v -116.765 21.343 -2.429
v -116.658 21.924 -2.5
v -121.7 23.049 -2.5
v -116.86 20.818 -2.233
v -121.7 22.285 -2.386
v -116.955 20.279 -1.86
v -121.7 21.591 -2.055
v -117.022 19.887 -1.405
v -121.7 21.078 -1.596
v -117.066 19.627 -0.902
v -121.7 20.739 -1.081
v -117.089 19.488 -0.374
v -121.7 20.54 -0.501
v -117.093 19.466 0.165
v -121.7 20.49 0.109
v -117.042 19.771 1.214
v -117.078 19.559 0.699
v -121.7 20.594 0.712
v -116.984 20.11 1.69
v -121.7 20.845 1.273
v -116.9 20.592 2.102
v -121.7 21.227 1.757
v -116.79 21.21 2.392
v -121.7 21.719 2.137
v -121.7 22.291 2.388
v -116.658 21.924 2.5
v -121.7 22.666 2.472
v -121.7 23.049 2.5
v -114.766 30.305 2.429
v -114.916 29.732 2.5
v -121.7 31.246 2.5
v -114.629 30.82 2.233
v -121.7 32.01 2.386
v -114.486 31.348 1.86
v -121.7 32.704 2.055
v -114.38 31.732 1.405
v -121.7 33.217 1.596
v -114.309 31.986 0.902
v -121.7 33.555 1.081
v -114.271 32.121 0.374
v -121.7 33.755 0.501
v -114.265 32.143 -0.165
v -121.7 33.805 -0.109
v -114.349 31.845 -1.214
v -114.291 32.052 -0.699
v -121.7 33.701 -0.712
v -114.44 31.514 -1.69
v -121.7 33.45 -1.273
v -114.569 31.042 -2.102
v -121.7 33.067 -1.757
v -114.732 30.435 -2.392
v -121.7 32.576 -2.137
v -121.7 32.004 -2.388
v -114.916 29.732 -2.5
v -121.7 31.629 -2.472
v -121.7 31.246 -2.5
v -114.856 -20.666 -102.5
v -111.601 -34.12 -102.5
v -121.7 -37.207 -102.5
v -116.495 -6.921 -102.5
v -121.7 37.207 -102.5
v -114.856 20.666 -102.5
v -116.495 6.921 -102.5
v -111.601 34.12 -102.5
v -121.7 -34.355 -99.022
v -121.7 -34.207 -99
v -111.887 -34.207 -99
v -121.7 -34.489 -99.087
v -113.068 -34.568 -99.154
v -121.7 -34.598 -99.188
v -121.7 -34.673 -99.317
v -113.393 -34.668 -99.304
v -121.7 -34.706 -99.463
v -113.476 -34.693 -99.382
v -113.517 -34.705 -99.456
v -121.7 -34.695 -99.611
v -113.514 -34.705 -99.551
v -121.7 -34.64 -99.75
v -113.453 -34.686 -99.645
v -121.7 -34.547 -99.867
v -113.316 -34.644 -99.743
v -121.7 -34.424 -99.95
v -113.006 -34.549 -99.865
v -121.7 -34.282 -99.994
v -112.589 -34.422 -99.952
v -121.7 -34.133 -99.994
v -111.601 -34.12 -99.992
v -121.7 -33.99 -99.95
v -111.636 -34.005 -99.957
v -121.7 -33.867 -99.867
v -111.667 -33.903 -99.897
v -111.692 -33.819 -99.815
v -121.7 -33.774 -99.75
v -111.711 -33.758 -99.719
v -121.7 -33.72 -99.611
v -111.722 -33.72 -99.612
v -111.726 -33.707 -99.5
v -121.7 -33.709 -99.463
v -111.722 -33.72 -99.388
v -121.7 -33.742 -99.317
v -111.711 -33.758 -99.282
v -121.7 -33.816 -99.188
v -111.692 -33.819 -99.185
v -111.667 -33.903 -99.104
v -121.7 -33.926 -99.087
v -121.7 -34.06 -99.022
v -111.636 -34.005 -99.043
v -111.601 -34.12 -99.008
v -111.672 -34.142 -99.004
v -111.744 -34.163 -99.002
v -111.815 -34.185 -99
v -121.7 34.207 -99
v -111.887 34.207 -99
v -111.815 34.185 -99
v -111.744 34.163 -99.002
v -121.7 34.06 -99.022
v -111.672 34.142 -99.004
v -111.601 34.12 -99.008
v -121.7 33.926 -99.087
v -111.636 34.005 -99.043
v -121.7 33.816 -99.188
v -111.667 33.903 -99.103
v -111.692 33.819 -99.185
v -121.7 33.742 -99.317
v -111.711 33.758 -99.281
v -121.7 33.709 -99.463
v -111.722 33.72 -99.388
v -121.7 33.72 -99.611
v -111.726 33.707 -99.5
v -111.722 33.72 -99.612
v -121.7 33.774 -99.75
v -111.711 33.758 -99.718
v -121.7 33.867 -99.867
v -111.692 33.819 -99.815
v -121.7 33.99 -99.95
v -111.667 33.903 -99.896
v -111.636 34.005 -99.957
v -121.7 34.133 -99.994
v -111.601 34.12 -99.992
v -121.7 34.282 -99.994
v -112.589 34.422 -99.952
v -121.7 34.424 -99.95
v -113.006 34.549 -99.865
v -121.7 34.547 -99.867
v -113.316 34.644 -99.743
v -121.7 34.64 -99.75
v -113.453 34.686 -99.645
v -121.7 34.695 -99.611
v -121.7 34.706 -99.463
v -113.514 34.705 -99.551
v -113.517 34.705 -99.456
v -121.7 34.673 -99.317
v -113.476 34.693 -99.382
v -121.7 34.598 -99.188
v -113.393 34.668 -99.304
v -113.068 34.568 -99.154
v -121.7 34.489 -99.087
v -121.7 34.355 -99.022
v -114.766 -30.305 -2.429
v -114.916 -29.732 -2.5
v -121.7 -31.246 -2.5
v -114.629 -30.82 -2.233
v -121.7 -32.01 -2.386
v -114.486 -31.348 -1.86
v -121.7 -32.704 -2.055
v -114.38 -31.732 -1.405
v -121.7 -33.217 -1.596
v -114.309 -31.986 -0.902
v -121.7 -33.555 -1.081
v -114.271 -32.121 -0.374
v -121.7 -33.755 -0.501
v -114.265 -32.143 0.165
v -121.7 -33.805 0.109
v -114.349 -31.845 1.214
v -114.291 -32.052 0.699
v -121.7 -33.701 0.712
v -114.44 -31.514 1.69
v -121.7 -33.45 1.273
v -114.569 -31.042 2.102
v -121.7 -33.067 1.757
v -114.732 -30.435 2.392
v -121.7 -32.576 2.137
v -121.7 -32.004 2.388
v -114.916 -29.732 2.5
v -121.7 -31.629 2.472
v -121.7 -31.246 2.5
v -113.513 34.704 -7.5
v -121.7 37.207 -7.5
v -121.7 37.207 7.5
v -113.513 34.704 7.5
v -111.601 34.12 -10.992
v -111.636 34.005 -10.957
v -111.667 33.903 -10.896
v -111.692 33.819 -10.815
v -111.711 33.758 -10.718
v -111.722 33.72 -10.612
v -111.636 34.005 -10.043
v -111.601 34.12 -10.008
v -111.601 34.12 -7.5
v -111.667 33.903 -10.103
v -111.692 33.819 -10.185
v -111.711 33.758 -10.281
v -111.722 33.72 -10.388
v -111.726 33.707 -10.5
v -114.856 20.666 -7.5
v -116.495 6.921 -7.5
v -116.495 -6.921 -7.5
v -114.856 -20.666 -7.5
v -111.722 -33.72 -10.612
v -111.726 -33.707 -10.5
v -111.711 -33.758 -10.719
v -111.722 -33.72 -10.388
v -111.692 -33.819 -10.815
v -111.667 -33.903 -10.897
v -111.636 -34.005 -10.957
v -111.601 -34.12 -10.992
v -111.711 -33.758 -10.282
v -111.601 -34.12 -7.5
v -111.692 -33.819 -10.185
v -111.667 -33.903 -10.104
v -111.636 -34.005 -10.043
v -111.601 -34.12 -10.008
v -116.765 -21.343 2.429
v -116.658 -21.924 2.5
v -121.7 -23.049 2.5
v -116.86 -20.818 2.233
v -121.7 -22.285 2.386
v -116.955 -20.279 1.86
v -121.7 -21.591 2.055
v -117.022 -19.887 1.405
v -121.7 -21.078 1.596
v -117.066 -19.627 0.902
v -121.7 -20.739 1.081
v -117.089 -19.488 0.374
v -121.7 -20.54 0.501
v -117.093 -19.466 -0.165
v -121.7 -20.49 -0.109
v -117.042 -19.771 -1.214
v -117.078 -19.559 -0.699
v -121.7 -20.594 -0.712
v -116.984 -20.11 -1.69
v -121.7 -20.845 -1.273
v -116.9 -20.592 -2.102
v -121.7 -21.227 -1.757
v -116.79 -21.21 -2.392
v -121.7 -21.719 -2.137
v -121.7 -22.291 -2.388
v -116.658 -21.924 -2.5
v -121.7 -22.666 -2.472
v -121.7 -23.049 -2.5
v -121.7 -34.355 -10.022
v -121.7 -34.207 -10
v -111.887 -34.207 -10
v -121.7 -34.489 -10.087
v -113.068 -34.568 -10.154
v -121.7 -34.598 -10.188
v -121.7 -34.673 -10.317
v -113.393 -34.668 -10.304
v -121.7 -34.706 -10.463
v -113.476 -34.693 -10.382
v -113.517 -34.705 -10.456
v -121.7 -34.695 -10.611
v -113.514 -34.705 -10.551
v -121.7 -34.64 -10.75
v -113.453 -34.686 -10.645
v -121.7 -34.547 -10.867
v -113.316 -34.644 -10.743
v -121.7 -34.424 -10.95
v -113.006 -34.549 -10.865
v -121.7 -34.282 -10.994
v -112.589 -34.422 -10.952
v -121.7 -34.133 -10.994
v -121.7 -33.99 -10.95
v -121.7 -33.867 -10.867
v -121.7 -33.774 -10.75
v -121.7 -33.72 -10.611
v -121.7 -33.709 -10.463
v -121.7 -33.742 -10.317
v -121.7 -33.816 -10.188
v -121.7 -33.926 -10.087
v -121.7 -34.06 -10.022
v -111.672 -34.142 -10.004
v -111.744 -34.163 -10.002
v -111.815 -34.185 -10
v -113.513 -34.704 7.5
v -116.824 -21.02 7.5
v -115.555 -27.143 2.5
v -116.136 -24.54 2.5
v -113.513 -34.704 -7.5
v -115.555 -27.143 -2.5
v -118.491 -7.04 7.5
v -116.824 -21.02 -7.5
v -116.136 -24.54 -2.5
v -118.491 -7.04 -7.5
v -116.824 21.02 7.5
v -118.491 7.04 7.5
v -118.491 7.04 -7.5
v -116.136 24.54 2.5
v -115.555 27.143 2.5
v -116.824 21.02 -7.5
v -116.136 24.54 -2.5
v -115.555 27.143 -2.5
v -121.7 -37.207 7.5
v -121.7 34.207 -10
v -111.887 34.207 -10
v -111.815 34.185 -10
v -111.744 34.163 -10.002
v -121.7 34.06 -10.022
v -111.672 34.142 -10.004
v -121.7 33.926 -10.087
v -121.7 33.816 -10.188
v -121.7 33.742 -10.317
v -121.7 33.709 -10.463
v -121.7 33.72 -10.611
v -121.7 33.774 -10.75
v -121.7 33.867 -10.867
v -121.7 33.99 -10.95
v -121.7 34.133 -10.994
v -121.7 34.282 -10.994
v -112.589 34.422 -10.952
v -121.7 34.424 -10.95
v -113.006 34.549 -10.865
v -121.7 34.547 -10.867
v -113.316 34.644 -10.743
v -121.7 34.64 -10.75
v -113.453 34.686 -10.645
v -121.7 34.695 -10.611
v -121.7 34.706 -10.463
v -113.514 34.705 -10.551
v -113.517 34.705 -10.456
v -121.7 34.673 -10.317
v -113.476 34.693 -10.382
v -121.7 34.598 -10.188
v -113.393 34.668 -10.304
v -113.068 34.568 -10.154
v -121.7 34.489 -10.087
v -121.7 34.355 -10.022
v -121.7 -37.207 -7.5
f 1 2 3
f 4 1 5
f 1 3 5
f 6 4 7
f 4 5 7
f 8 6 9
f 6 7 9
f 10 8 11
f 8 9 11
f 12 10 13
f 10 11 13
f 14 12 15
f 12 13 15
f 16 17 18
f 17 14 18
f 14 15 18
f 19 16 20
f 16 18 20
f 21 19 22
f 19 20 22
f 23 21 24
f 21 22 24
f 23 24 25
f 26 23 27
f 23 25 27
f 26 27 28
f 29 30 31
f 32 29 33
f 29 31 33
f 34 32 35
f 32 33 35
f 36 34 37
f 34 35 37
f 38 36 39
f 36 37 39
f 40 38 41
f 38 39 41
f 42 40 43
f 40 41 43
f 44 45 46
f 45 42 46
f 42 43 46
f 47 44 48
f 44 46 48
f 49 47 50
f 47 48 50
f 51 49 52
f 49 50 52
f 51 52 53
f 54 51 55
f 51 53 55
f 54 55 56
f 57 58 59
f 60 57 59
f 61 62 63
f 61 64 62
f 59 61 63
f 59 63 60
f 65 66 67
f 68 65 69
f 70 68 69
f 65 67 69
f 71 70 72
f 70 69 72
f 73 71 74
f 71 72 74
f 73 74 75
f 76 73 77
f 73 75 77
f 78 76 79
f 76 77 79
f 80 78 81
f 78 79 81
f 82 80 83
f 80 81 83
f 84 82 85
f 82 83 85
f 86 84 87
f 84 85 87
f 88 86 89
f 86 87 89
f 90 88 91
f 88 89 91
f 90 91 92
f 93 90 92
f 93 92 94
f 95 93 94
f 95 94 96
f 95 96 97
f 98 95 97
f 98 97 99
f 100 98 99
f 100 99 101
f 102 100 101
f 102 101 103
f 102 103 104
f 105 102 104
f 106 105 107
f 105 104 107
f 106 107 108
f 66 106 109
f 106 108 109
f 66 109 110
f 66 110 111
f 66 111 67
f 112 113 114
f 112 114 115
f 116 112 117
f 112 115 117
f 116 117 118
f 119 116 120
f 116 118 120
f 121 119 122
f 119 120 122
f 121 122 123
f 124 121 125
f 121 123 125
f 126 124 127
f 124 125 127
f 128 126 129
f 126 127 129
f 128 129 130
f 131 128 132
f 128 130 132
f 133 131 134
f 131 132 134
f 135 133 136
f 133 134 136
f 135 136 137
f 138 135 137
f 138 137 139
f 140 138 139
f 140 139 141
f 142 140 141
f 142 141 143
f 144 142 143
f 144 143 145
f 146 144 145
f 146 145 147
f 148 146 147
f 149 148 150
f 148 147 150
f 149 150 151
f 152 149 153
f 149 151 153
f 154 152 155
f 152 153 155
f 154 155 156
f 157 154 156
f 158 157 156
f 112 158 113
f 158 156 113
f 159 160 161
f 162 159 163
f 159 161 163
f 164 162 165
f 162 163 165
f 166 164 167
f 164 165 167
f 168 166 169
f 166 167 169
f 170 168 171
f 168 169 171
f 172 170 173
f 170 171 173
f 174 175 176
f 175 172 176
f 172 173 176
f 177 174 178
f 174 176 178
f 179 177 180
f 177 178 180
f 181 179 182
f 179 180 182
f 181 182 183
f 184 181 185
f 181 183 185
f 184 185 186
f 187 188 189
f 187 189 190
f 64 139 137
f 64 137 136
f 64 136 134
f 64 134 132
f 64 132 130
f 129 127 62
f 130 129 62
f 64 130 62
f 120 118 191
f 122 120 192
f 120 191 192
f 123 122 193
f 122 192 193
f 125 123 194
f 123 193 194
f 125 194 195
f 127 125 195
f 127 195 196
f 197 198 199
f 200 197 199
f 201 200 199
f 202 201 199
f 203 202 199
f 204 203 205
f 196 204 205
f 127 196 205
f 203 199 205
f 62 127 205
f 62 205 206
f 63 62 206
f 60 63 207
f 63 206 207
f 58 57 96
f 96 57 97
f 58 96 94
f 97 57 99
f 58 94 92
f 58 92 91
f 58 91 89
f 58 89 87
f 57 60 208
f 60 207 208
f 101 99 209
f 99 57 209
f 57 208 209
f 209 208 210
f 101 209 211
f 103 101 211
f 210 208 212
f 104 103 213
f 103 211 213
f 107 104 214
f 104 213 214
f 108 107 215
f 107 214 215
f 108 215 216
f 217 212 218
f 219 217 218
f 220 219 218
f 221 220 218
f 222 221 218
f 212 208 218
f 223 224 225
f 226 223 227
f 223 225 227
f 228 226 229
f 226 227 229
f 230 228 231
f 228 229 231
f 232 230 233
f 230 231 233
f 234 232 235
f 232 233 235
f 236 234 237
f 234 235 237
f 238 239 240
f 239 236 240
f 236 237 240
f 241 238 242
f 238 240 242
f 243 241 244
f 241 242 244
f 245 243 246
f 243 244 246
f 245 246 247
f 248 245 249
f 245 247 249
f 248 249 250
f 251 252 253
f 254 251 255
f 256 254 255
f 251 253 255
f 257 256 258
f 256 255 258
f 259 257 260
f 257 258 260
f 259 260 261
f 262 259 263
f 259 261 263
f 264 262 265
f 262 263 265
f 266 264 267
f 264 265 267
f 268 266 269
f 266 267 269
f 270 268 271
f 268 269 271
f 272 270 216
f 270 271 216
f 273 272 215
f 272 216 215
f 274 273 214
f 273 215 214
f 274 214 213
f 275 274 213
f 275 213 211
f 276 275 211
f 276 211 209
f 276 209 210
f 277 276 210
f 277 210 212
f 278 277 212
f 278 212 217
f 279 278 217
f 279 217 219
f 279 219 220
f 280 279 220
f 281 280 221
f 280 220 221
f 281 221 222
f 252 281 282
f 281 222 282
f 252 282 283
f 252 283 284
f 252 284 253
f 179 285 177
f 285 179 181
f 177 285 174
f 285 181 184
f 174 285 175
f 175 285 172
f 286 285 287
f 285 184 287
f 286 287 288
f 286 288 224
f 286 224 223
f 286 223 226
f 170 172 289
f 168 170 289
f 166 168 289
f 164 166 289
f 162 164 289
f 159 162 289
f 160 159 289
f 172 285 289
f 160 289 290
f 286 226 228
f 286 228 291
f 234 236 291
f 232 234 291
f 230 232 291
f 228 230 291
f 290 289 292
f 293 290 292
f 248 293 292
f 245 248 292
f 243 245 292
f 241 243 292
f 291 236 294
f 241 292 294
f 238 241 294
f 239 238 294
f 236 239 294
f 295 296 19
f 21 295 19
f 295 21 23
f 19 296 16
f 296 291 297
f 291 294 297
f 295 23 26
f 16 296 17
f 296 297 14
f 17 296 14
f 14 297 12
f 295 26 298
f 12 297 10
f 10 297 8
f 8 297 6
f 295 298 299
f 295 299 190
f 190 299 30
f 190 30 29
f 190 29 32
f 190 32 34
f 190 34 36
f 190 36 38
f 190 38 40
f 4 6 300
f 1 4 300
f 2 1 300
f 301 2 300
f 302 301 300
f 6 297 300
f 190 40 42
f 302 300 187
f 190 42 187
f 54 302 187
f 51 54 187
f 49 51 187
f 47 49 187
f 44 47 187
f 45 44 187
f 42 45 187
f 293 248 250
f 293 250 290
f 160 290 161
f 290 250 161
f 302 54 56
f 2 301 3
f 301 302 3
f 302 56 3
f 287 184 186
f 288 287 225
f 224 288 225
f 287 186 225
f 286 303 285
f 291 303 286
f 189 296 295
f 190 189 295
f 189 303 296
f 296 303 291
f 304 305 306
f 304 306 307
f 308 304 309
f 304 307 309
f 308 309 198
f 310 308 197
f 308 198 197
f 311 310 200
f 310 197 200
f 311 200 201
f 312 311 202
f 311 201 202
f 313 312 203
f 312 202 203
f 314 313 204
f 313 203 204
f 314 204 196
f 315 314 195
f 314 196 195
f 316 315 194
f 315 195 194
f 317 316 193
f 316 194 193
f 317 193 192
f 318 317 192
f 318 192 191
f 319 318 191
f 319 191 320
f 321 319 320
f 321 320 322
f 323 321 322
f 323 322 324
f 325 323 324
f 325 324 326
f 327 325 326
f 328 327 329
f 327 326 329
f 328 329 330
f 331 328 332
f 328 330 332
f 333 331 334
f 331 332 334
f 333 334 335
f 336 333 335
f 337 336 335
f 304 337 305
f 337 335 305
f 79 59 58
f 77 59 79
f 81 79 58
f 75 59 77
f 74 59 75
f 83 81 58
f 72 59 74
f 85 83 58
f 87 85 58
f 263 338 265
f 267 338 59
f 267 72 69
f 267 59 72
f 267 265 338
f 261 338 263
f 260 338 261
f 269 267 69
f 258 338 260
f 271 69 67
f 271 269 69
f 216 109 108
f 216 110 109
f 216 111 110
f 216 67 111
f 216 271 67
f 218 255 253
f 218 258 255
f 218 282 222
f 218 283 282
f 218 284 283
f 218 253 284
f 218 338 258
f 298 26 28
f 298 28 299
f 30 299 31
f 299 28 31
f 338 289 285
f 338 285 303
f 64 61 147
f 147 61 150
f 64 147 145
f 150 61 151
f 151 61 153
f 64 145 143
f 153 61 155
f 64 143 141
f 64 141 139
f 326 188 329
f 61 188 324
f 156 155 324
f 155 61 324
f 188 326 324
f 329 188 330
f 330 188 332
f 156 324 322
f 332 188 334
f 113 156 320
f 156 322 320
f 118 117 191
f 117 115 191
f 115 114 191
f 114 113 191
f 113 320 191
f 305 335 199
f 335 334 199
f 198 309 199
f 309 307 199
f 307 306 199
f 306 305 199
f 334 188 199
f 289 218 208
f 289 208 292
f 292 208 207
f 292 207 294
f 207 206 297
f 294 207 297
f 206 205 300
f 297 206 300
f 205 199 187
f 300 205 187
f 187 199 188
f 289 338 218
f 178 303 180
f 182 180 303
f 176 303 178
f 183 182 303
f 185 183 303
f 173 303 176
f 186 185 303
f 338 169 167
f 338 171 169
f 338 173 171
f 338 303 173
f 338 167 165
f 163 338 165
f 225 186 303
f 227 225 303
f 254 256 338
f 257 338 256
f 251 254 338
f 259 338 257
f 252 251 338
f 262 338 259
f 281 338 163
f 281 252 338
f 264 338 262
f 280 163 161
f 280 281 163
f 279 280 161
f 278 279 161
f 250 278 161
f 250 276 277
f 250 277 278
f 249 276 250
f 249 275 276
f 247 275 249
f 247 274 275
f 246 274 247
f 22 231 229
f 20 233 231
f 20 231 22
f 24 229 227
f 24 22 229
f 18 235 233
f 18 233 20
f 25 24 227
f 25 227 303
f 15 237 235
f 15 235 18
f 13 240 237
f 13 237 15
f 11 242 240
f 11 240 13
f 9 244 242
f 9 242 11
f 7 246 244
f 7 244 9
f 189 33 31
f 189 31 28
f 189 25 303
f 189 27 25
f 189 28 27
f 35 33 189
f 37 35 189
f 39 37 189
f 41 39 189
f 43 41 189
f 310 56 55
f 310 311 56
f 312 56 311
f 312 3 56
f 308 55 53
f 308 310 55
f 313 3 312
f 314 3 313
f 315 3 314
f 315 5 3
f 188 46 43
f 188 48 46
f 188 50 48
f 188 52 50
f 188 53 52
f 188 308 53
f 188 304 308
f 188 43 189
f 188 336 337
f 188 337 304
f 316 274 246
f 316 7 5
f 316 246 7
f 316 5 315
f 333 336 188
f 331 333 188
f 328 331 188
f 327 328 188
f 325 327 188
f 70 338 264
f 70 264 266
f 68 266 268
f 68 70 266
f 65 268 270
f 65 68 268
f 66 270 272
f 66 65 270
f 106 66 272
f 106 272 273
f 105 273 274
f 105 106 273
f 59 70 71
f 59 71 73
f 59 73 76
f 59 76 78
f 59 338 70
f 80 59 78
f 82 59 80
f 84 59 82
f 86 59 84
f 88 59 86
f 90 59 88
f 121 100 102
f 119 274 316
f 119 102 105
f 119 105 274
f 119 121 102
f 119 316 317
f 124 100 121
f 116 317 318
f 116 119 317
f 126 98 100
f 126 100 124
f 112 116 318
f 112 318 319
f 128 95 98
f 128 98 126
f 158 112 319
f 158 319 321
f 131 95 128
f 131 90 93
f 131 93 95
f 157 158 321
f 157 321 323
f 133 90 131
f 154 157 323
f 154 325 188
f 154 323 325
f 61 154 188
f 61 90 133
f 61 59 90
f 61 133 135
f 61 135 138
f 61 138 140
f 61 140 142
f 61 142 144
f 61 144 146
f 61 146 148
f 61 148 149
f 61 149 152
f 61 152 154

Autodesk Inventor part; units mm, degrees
ref_plane "YZ Plane" through (0, 0, 0) normal (1, 0, 0) x (0, 1, 0)
sketch "Sketch1" plane through (0, 0, 0) normal (0, 0, 1) x (1, 0, 0)
  arc A0 (-113.5134, 34.7045) -> (-113.5134, -34.7045) centre (0, 0) ccw
  line L0 (0, 0) -> (-118.7, 0) construction
  line L1 (0, 0) -> (-113.5134, -34.7045) construction
  line L2 (-113.5134, -34.7045) -> (-113.5134, 0) construction
  line L3 (-113.5134, 0) -> (-113.5134, 34.7045) construction
  arc A1 (-116.3823, 35.5816) -> (-116.3823, -35.5816) centre (0, 0) ccw construction
  line L4 (-113.5134, 34.7045) -> (0, 0) construction
  line L5 (-113.5134, -34.7045) -> (-121.7, -37.2074)
  arc A2 (-113.5134, -34.7045) -> (-113.5134, 34.7045) centre (0, 0) ccw construction
  arc A3 (-116.3823, -35.5816) -> (-116.3823, 35.5816) centre (0, 0) ccw construction
  line L6 (-118.7, 0) -> (-121.7, 0) construction
  line L7 (-121.7, 37.2074) -> (-113.5134, 34.7045)
  line L8 (-121.7, 0) -> (-121.7, 37.2074)
  line L9 (-121.7, 0) -> (-121.7, -37.2074)
  dimension "d0" = 237.4
  dimension "d22" = 17
  dimension "d36" = 3
extrude "Extrusion1" add sketch "Sketch1" along normal mid plane 15
sketch "Sketch11" plane through (0, 0, 0) normal (0, 0, 1) x (1, 0, 0)
  line L0 (-121.7, 37.2074) -> (-121.7, -37.2074) projected
  line L1 (0, 0) -> (-115.8526, 25.8431) construction
  line L2 (0, 0) -> (-121.7, 0) construction
  line L3 (0, 0) -> (-115.8526, -25.8431) construction
  circle A0 centre (0, 0) radius 124.6911 construction
  arc A1 (-113.5134, 34.7045) -> (-113.5134, -34.7045) centre (0, 0) ccw projected
  line L4 (-115.8526, 25.8431) -> (-121.7, 27.1474) construction
  line L5 (-115.8526, -25.8431) -> (-121.7, -27.1474) construction
  dimension "d48" = 12.575
  dimension "d49" = 12.575
ref_plane "Work Plane7" through (-115.8526, 25.8431, 0) normal (0.976, -0.2177, 0) x (0.2177, 0.976, 0)
ref_plane "Work Plane8" through (-115.8526, -25.8431, 0) normal (0.976, 0.2177, 0) x (-0.2177, 0.976, 0)
sketch "Sketch12" plane through (-115.8526, 25.8431, 0) normal (0.976, -0.2177, 0) x (0.2177, 0.976, 0)
  line L0 (-4, 0) -> (4, 0) construction
  line L1 (-4, 2.5) -> (4, 2.5)
  line L2 (4, -2.5) -> (-4, -2.5)
  arc A0 (-4, 2.5) -> (-4, -2.5) centre (-4, 0) ccw
  arc A1 (4, -2.5) -> (4, 2.5) centre (4, 0) ccw
  point P0 (0, 0)
  dimension "d50" = 4
  dimension "d51" = 5
extrude "Extrusion10" cut sketch "Sketch12" along normal through all both and the other way through all
sketch "Sketch13" plane through (-115.8526, -25.8431, 0) normal (0.976, 0.2177, 0) x (-0.2177, 0.976, 0)
  line L0 (-4, 0) -> (4, 0) construction
  line L1 (-4, 2.5) -> (4, 2.5)
  line L2 (4, -2.5) -> (-4, -2.5)
  arc A0 (-4, 2.5) -> (-4, -2.5) centre (-4, 0) ccw
  arc A1 (4, -2.5) -> (4, 2.5) centre (4, 0) ccw
  point P0 (0, 0)
  dimension "d54" = 5
  dimension "d55" = 4
extrude "Extrusion11" cut sketch "Sketch13" along normal through all both and the other way through all
ref_plane "Work Plane10" through (-125.6127, 28.0202, 0) normal (0.976, -0.2177, 0) x (0.2177, 0.976, 0)
ref_plane "Work Plane11" through (-125.6127, -28.0202, 0) normal (0.976, 0.2177, 0) x (-0.2177, 0.976, 0)
sketch "Sketch15" plane through (-125.6127, 28.0202, 0) normal (0.976, -0.2177, 0) x (0.2177, 0.976, 0)
  line L0 (5, 0) -> (-5, 0) construction
  line L1 (5, -3.5) -> (-5, -3.5)
  line L2 (-5, 3.5) -> (5, 3.5)
  arc A0 (5, -3.5) -> (5, 3.5) centre (5, 0) ccw
  arc A1 (-5, 3.5) -> (-5, -3.5) centre (-5, 0) ccw
  point P0 (0, 0)
  dimension "d61" = 7
  dimension "d62" = 5
extrude "Extrusion12" [suppressed]
sketch "Sketch16" plane through (-125.6127, -28.0202, 0) normal (0.976, 0.2177, 0) x (-0.2177, 0.976, 0)
  line L0 (5, 0) -> (-5, 0) construction
  line L1 (5, -3.5) -> (-5, -3.5)
  line L2 (-5, 3.5) -> (5, 3.5)
  arc A0 (5, -3.5) -> (5, 3.5) centre (5, 0) ccw
  arc A1 (-5, 3.5) -> (-5, -3.5) centre (-5, 0) ccw
  point P0 (0, 0)
  dimension "d65" = 7
  dimension "d66" = 5
extrude "Extrusion13" [suppressed]
sketch "Sketch19" plane through (0, 0, -7.5) normal (0, 0, -1) x (-1, 0, 0)
  arc A0 (113.5134, -34.7045) -> (113.5134, 34.7045) centre (0, 0) ccw projected
  arc A1 (111.6008, -34.1198) -> (111.6008, 34.1198) centre (0, 0) ccw
  line L0 (121.7, 37.2074) -> (121.7, -37.2074) projected
  line L1 (121.7, -37.2074) -> (121.7, 37.2074)
  line L2 (121.7, 37.2074) -> (111.6008, 34.1198)
  line L3 (121.7, -37.2074) -> (111.6008, -34.1198)
  point P0 (0, 0)
  dimension "d75" = 2
extrude "Extrusion15" add sketch "Sketch19" along normal blind 95
sketch "Sketch20" plane through (-121.7, -37.2074, 7.5) normal (-1, 0, 0) x (0, 0, 1)
  line L0 (-107, 3) -> (-18, 3) construction
  line L1 (-18, 3) -> (-18, 71.4148) construction
  line L2 (-18, 71.4148) -> (-107, 71.4148) construction
  line L3 (-107, 71.4148) -> (-107, 3) construction
  line L4 (-15, 2.5029) -> (-15, 71.9119) construction
  line L5 (-110, 74.4148) -> (0, 74.4148) projected
  line L6 (-110, 0) -> (0, 0) projected
  line L7 (-110, 0) -> (-110, 74.4148) projected
  point P0 (-7.5, 37.2074)
  dimension "d78" = 3
  dimension "d79" = 3
  dimension "d80" = 3
  dimension "d81" = 3
  dimension "d82" = 89
  dimension "d83" = 68.4149
hole "Hole1" at (-121.7, 34.2074, -99.5) at (-121.7, 34.2074, -10.5) at (-121.7, -34.2074, -99.5) at (-121.7, -34.2074, -10.5) direction (1, 0, 0) diameter 1 depth 25 tip angle 118
equation "\"d49\" = d48"
equation "\"angulo_alabe\" = 130deg"
equation "\"diametro_tubo\" = 232"
equation "\"desfase_a_pin_superior\" = 12"
equation "\"desfase_b_pin_inferior\" = 8"
equation "\"desfase_b_pin_superior\" = 0"
equation "\"diametro_max_soporte\" = 248"
properties part number "accesorios separador 1"
